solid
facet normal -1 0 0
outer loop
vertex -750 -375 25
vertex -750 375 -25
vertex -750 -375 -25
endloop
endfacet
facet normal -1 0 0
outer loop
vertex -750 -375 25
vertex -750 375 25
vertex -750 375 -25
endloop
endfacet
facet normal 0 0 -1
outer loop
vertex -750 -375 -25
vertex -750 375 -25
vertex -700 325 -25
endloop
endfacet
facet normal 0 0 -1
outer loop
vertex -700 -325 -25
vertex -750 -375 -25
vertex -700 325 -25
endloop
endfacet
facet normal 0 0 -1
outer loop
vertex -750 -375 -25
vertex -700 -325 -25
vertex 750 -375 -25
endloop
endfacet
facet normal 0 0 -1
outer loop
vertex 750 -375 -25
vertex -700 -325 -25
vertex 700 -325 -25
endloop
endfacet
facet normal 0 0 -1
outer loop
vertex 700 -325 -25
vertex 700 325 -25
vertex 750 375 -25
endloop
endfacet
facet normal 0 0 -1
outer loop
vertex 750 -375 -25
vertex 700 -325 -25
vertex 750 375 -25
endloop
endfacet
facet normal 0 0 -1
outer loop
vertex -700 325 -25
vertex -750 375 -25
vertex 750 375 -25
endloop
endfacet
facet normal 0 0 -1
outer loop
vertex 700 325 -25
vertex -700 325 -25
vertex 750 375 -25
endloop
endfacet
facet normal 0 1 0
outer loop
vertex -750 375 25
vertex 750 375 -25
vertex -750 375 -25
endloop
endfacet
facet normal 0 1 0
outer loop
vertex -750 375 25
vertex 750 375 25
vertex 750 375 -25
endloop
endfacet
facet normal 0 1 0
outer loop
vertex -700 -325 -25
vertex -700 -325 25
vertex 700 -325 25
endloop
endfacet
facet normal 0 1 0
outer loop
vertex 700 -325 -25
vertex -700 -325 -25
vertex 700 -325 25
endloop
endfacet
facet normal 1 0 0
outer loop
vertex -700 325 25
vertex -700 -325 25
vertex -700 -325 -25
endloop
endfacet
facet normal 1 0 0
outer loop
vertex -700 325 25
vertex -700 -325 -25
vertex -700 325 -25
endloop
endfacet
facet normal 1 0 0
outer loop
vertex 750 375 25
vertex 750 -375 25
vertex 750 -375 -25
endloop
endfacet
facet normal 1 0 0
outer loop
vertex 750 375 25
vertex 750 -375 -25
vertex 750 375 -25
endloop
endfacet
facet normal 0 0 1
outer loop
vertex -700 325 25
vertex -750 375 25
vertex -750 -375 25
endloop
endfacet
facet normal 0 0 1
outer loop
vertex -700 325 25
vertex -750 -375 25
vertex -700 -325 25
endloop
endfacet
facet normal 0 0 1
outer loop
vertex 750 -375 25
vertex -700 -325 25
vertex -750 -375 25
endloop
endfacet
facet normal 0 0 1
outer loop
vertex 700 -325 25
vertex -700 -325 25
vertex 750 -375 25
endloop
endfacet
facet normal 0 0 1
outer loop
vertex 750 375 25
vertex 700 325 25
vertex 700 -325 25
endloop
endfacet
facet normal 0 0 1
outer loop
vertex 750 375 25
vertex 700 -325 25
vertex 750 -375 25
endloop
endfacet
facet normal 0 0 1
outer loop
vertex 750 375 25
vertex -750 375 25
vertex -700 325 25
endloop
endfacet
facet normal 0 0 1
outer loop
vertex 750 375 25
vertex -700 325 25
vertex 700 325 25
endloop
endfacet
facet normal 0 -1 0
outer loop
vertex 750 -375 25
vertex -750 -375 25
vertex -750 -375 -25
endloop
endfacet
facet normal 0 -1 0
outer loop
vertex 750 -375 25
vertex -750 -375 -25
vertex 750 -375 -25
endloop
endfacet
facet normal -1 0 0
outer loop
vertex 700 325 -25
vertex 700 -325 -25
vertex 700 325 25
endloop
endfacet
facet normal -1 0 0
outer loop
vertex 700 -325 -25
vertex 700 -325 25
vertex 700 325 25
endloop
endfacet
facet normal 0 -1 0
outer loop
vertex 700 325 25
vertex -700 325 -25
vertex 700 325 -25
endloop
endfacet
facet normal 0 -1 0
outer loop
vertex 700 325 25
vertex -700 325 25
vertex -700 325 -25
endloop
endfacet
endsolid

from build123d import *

# Parameters (mm, degrees)
F0_W     = 1400
F0_H     = 650
F1_DEPTH = 25


with BuildPart() as f1:
    # F0 (on Top) → F1 (new body, symmetric)
    with BuildSketch(Plane.XY):
        Polygon((-750, 375), (-750, -375), (-359.724497, -375), (-309.724497, -375), (0, -375), (309.724497, -375), (359.724497, -375), (522.343877, -375), (750, -375), (750, 375), align=None)
        Rectangle(F0_W, F0_H, mode=Mode.SUBTRACT)
    extrude(amount=F1_DEPTH, both=True)


solid = f1.part
